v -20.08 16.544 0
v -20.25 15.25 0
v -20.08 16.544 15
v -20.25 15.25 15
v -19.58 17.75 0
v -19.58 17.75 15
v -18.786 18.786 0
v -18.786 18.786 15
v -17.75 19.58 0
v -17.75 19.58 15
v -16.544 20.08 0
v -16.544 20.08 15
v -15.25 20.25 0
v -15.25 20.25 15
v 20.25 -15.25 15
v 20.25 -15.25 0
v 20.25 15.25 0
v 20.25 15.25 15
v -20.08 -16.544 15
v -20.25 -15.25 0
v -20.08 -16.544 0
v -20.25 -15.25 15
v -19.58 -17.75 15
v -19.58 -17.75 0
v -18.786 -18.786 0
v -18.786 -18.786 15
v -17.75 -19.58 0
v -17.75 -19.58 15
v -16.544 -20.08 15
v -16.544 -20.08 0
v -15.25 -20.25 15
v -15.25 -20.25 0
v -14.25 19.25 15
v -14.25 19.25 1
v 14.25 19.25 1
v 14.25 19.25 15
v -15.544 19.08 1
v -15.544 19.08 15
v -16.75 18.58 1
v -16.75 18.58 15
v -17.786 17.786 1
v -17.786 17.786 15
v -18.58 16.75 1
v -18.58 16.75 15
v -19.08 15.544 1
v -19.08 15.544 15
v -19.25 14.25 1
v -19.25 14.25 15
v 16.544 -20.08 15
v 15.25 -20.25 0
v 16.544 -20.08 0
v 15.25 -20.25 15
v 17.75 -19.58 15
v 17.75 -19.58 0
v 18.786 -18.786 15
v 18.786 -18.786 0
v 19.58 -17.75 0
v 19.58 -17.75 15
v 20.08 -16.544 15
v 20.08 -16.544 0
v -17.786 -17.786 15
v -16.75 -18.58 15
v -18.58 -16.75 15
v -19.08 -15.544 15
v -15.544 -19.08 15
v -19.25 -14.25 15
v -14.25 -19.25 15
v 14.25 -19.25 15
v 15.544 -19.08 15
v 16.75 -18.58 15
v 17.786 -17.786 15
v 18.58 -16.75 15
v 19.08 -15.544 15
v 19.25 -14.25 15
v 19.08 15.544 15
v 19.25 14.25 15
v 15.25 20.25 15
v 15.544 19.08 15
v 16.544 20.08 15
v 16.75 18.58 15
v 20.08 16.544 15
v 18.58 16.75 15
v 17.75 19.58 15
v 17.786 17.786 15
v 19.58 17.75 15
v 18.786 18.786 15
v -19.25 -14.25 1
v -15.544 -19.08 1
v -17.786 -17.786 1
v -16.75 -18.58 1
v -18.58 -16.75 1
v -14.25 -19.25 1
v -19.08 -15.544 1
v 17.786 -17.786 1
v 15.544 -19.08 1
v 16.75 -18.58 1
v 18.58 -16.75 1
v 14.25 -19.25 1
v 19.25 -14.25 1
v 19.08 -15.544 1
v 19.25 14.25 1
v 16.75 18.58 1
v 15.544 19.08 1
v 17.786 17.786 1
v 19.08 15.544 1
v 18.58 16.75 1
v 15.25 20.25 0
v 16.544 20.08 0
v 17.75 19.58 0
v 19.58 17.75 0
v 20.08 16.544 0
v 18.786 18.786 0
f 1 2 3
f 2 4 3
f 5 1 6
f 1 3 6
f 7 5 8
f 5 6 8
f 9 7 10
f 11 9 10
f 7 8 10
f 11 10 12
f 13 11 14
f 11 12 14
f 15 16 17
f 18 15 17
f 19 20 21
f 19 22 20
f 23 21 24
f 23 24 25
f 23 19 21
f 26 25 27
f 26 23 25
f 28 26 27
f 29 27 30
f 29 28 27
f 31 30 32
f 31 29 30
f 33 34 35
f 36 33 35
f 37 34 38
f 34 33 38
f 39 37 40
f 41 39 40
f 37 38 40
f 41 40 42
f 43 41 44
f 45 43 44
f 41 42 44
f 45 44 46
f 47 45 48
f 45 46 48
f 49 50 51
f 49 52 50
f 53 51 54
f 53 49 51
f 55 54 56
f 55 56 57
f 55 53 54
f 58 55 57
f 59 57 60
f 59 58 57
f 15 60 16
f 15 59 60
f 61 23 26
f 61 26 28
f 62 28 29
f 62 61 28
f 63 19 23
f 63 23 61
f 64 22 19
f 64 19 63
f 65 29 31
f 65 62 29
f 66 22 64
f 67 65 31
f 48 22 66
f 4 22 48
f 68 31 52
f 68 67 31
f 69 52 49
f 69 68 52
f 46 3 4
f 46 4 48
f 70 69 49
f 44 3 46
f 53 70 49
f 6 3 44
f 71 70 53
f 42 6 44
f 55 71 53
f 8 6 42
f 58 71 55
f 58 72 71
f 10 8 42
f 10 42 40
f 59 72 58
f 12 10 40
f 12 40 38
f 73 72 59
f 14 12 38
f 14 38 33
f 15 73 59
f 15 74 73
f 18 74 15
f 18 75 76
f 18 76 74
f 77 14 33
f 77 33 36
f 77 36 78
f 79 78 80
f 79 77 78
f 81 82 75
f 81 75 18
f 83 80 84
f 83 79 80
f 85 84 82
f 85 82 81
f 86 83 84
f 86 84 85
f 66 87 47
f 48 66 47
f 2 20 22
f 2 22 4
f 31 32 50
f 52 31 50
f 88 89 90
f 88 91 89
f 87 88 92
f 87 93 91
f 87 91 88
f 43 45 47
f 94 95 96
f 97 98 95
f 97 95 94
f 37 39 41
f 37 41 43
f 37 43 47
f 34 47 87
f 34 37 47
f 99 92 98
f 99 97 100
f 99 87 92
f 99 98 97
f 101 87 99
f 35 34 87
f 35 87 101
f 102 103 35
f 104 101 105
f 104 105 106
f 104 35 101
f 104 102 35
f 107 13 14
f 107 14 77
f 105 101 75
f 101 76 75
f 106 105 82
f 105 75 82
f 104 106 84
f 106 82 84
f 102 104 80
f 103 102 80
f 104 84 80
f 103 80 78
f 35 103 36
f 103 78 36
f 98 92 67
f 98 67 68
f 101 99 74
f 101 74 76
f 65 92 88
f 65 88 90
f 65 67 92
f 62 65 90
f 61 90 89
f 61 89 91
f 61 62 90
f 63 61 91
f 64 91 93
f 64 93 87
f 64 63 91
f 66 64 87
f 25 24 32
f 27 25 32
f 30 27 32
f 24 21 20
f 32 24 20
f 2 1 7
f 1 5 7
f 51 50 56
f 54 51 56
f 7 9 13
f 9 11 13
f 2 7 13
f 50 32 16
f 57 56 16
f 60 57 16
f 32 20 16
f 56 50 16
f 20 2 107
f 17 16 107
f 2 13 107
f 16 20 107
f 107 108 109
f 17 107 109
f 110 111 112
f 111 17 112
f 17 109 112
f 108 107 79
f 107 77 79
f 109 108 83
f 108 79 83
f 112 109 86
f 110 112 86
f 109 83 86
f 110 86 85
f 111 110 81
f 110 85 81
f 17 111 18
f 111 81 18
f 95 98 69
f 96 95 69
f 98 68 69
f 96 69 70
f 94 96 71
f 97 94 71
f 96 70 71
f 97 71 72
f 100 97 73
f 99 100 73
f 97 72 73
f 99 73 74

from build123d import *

# Parameters (mm, degrees)
F0_W     = 38.5
F0_H     = 38.5
F1_DEPTH = 1
F0_W_2   = 40.5
F0_H_2   = 40.5
F2_DEPTH = 15
F3_R     = 5


with BuildPart() as f1:
    # F0 (on Top) → F1 (new body)
    with BuildSketch(Plane.XY):
        Rectangle(F0_W, F0_H)
    extrude(amount=F1_DEPTH)

    # F0 (on Top) → F2 (join)
    with BuildSketch(Plane.XY):
        Rectangle(F0_W_2, F0_H_2)
        Rectangle(F0_W, F0_H, mode=Mode.SUBTRACT)
    extrude(amount=F2_DEPTH)

    # F3
    f3_edges = [f1.edges().sort_by_distance(p)[0] for p in [
        (20.25, -20.25, 7.5),
        (19.25, -19.25, 8),
        (-19.25, -19.25, 8),
        (-19.25, 19.25, 8),
        (19.25, 19.25, 8),
        (-20.25, -20.25, 7.5),
        (-20.25, 20.25, 7.5),
        (20.25, 20.25, 7.5),
    ]]
    fillet(f3_edges, radius=F3_R)


solid = f1.part
